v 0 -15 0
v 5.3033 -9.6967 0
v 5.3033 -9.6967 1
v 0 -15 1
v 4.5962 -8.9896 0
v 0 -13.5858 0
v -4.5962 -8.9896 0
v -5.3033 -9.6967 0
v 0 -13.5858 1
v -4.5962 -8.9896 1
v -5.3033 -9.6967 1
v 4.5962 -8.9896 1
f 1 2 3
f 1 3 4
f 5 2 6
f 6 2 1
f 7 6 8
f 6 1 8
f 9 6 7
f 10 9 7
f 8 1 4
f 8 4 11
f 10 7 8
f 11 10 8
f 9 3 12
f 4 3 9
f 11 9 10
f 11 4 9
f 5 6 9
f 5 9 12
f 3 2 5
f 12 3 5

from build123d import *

# Parameters (mm, degrees)
BOX088_W                  = 7.5
BOX088_H                  = 1
BOX088_DEPTH              = 1
BOX087_W                  = 7.5
BOX087_H                  = 1
BOX087_DEPTH              = 1
FUSION017_PLACEMENT_ANGLE = 45


with BuildPart() as cube088:
    # Box088 → Box088 (new body)
    with BuildSketch(Plane.XY):
        with Locations((3.75, 0.5)):
            Rectangle(BOX088_W, BOX088_H)
    extrude(amount=BOX088_DEPTH)


with BuildPart() as bigarrowled:
    # Box087 → Box087 (new body)
    with BuildSketch(Plane(origin=(1, 0, 0), x_dir=(0, 1, 0), z_dir=(0, 0, 1))):
        with Locations((3.75, 0.5)):
            Rectangle(BOX087_W, BOX087_H)
    extrude(amount=BOX087_DEPTH)

    # Fusion017: union Cube088
    add(cube088.part)


with BuildPart() as bigarrowled_1:
    # Fusion017 placement: moved
    add(bigarrowled.part.moved(Location((0, -15, 0))).rotate(Axis((0, -15, 0), (0, 0, 1)), FUSION017_PLACEMENT_ANGLE))


solid = bigarrowled_1.part
